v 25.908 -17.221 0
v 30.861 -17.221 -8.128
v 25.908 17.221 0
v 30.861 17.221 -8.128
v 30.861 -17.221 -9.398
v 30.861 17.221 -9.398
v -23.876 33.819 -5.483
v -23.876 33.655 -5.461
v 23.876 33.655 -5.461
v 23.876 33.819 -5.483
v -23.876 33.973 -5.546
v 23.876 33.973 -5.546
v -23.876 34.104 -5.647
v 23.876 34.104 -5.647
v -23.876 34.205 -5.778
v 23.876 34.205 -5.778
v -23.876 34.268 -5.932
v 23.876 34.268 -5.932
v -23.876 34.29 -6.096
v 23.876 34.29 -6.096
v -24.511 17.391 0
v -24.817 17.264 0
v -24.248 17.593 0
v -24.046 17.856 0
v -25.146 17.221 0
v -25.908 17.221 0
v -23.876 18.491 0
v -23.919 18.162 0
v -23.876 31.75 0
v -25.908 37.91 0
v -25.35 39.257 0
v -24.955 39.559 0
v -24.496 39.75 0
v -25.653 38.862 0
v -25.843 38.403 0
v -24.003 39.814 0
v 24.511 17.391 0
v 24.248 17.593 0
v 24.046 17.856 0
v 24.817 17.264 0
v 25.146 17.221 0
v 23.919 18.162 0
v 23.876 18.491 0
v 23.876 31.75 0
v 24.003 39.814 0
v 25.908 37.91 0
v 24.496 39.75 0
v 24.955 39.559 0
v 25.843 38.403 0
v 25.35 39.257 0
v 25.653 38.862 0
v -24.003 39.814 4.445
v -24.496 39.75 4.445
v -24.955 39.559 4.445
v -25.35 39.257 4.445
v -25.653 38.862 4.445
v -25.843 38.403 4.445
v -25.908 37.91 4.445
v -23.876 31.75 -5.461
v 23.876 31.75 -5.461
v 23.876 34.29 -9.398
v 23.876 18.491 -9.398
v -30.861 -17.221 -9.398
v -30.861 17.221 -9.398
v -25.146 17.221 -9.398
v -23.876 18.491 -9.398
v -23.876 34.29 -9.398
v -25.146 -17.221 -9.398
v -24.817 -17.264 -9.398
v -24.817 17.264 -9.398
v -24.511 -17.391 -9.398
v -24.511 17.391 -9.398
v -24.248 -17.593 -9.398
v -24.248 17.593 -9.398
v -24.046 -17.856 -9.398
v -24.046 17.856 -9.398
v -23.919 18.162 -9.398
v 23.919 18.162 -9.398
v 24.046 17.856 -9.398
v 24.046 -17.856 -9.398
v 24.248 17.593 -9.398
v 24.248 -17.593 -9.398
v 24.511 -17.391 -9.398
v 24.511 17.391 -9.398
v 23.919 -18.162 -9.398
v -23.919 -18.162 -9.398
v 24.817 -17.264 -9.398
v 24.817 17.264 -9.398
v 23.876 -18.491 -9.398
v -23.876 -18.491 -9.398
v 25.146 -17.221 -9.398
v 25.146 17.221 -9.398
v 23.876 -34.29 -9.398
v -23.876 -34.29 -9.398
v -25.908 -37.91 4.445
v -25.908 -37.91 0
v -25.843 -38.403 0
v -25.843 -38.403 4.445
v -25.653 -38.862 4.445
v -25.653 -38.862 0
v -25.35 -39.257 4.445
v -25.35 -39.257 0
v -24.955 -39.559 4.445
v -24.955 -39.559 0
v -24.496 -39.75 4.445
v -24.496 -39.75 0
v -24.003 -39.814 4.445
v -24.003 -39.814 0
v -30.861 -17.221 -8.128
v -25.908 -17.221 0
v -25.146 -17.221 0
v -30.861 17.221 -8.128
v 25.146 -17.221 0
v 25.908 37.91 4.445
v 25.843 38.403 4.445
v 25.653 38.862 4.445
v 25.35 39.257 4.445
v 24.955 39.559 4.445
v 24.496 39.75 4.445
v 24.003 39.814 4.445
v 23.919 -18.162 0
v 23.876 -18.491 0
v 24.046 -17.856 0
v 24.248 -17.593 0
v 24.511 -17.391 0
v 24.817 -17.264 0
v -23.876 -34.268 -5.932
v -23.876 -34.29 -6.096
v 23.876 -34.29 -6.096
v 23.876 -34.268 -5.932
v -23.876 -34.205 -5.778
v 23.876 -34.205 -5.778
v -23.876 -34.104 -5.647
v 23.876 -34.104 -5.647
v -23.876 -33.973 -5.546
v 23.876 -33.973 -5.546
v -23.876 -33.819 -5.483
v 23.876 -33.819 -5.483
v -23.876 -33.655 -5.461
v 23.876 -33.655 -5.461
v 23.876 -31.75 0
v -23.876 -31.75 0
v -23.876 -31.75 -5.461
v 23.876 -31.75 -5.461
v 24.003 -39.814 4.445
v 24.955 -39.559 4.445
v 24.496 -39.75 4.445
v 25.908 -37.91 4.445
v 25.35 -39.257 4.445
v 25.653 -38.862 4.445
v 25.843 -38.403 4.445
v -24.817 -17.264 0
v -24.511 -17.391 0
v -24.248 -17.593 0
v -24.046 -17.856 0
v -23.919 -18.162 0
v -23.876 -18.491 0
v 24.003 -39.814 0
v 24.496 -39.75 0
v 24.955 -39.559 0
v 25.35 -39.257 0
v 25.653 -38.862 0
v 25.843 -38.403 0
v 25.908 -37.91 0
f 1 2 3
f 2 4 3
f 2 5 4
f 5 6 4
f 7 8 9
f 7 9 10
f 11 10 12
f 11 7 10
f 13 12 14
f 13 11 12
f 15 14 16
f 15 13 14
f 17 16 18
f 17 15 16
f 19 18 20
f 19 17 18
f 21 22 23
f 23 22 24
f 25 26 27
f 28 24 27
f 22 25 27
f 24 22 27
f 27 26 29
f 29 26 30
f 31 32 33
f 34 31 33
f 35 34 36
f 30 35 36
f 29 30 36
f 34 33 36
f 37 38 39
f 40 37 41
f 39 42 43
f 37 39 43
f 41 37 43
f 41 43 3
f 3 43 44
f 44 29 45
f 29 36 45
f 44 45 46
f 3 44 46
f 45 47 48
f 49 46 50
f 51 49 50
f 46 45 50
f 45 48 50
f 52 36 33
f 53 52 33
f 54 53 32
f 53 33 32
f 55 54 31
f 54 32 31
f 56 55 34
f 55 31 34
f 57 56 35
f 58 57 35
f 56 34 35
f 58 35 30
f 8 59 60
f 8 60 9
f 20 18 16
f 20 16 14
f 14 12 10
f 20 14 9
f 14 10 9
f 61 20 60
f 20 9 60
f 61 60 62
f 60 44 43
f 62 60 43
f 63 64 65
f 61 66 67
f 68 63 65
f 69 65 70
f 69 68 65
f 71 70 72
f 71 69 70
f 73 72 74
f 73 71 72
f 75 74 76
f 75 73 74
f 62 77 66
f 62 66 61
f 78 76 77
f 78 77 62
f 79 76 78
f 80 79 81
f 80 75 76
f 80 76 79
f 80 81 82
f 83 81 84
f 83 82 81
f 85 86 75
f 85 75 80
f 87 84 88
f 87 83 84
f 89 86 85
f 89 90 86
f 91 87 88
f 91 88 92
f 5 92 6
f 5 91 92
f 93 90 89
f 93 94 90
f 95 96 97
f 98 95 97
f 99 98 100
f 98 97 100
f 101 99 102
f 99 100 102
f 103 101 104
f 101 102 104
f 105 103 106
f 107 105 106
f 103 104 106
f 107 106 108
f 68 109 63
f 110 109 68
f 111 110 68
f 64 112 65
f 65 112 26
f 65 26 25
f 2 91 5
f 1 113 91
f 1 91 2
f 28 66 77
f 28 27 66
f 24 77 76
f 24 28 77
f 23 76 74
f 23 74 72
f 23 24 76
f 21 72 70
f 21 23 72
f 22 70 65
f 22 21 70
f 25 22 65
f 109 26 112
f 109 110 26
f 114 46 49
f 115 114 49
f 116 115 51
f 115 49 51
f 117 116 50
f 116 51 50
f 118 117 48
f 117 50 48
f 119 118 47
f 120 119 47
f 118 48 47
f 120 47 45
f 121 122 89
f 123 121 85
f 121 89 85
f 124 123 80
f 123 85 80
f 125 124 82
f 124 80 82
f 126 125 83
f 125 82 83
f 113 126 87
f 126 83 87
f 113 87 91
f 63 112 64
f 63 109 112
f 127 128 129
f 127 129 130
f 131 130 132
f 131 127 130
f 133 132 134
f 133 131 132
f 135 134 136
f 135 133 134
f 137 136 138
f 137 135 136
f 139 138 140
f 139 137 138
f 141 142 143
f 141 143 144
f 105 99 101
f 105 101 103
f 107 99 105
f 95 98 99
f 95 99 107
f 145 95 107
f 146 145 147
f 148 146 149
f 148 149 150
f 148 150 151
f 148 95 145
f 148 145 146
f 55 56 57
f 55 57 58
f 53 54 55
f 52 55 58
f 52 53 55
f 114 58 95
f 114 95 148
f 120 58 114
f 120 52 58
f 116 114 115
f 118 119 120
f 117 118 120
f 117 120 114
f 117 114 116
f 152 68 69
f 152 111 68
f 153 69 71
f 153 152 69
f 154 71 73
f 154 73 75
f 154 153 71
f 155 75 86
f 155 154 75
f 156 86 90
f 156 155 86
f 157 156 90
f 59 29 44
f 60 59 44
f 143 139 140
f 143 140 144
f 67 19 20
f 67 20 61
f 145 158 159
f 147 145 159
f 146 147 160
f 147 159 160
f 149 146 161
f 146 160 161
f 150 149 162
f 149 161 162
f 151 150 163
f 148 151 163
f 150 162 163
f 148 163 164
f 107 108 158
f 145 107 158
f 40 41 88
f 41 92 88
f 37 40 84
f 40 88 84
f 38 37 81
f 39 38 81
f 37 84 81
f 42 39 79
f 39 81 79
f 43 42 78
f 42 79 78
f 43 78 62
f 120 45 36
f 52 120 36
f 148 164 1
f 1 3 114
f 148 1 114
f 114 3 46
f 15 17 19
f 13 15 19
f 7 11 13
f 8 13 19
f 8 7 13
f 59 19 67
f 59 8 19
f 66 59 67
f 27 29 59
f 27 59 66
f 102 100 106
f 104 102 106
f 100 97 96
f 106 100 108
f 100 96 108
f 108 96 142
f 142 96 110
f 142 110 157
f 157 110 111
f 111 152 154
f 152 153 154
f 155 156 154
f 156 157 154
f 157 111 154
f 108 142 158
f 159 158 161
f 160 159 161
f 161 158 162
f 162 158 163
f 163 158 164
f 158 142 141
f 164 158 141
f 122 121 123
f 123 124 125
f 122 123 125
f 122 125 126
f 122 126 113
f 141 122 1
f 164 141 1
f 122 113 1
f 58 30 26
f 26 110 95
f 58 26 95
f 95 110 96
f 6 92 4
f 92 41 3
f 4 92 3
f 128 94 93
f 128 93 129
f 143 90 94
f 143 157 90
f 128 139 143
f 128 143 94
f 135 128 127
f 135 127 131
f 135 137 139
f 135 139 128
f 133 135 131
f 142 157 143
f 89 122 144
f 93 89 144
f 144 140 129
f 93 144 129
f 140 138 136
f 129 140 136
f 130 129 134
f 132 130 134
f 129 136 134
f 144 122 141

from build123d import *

# Parameters (mm, degrees)
F1_DEPTH      = 4.445
F2_W          = 47.752
F2_H          = 63.5
F3_DEPTH      = 9.398
F5_DEPTH      = 47.752
F7_DEPTH      = 17.2212
F7_DEPTH_BACK = 17.2212
F8_R          = 1.27


with BuildPart() as f1:
    # F0 (on Top) → F1 (new body)
    with BuildSketch(Plane.XY):
        with BuildLine():
            Line((-24.003, -39.8145), (24.003, -39.8145))
            ThreePointArc((24.003, -39.8145), (25.350038, -39.256538), (25.908, -37.9095))
            Line((25.908, -37.9095), (25.908, 37.9095))
            ThreePointArc((25.908, 37.9095), (25.350038, 39.256538), (24.003, 39.8145))
            Line((24.003, 39.8145), (-24.003, 39.8145))
            ThreePointArc((-24.003, 39.8145), (-25.350038, 39.256538), (-25.908, 37.9095))
            Line((-25.908, 37.9095), (-25.908, -37.9095))
            ThreePointArc((-25.908, -37.9095), (-25.350038, -39.256538), (-24.003, -39.8145))
        make_face()
    extrude(amount=F1_DEPTH)

    # F2 (on face) → F3 (join)
    with BuildSketch(Plane(origin=(0, 0, 0), x_dir=(1, 0, 0), z_dir=(0, 0, -1))):
        Rectangle(F2_W, F2_H)
    extrude(amount=F3_DEPTH)

    # F4 (on face) → F5 (join, through all)
    with BuildSketch(Plane(origin=(-23.876, 0, 0), x_dir=(0, -1, 0), z_dir=(-1, 0, 0))):
        with BuildLine():
            Line((-34.29, -9.398), (-31.75, -9.398))
            Line((-31.75, -9.398), (-31.75, -5.461))
            Line((-31.75, -5.461), (-33.655, -5.461))
            ThreePointArc((-33.655, -5.461), (-34.104013, -5.646987), (-34.29, -6.096))
            Line((-34.29, -6.096), (-34.29, -9.398))
        make_face()
        with BuildLine():
            ThreePointArc((34.29, -6.096), (34.104013, -5.646987), (33.655, -5.461))
            Line((33.655, -5.461), (31.75, -5.461))
            Line((31.75, -5.461), (31.75, -9.398))
            Line((31.75, -9.398), (34.29, -9.398))
            Line((34.29, -9.398), (34.29, -6.096))
        make_face()
    extrude(amount=-F5_DEPTH)

    # F6 (on Front) → F7 (join, two sides)
    with BuildSketch(Plane.XZ) as f7_sk:
        Polygon((-30.861, -9.398), (-23.876, -9.398), (-23.876, 0), (-25.908, 0), (-30.861, -8.128), align=None)
        Polygon((30.861, -9.398), (30.861, -8.128), (25.908, 0), (23.876, 0), (23.876, -9.398), align=None)
    extrude(amount=F7_DEPTH)
    extrude(f7_sk.sketch, amount=-F7_DEPTH_BACK)

    # F8
    f8_edges = [f1.edges().sort_by_distance(p)[0] for p in [
        (23.876, -17.2212, -4.699),
        (23.876, 17.2212, -4.699),
        (-23.876, 17.2212, -4.699),
        (-23.876, -17.2212, -4.699),
    ]]
    fillet(f8_edges, radius=F8_R)


solid = f1.part
